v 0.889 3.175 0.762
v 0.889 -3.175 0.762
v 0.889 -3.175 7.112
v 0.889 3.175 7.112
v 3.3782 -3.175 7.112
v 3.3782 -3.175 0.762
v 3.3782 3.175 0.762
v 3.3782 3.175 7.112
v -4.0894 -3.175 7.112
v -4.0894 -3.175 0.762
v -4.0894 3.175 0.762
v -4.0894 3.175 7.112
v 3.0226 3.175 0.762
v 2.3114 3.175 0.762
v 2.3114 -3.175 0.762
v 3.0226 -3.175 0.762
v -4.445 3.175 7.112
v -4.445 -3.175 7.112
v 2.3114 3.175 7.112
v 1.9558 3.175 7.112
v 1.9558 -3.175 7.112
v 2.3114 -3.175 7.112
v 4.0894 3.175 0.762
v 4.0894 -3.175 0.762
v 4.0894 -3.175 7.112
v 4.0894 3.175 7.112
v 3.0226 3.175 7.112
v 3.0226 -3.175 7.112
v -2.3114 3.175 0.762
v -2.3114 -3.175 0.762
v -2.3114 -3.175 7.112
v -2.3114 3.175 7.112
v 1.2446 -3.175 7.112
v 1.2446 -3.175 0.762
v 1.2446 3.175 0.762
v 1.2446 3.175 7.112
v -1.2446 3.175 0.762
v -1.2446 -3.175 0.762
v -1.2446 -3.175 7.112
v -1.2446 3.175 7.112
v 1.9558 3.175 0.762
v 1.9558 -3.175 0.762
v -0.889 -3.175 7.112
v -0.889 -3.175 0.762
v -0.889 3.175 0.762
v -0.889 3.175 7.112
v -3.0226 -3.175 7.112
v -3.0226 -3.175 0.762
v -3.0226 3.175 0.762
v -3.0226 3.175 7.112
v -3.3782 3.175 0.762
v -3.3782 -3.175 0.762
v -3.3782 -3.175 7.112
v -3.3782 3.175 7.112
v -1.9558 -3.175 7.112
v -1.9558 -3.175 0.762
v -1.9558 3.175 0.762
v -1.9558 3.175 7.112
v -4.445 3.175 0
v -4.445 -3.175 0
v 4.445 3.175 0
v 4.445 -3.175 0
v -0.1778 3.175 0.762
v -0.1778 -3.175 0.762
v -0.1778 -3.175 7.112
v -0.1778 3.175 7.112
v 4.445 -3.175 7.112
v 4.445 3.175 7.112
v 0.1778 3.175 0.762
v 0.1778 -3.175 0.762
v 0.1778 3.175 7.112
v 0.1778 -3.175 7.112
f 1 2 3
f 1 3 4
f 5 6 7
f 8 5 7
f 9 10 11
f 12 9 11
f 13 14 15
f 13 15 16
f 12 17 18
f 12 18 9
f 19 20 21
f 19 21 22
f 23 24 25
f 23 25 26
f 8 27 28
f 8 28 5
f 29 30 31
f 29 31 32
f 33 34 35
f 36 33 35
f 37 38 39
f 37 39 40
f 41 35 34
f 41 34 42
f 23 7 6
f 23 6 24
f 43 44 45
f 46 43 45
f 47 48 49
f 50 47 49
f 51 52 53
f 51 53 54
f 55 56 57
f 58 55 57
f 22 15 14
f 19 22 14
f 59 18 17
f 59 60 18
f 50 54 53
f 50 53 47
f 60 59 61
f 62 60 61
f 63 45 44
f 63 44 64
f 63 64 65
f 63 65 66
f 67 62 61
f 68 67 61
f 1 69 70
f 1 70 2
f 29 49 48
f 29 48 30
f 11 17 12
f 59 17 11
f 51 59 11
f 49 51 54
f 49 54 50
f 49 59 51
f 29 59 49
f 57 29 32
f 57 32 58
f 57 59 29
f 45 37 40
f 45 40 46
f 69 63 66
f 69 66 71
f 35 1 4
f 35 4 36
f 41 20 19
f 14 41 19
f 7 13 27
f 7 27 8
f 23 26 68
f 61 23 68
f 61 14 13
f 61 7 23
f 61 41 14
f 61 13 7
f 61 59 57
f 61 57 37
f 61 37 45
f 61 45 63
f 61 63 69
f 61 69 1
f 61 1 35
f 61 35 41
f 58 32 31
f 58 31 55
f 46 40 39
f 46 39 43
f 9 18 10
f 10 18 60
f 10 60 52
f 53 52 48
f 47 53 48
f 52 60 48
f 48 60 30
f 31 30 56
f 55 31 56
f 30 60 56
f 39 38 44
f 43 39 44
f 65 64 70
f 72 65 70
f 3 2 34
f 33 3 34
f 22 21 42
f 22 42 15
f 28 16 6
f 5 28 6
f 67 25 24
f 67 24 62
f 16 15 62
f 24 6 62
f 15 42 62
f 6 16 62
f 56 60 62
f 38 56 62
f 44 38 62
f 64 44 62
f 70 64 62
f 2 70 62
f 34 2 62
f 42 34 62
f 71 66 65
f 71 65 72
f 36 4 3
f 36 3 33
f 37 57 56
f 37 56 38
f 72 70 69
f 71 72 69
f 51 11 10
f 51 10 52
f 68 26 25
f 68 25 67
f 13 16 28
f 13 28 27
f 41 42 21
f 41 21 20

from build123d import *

# Parameters (mm, degrees)
F0_W     = 8.89
F0_H     = 6.35
F1_DEPTH = 0.762
F2_W     = 0.3556
F2_H     = 6.35
F3_DEPTH = 6.35


with BuildPart() as f1:
    # F0 (on Top) → F1 (new body)
    with BuildSketch(Plane.XY):
        Rectangle(F0_W, F0_H)
    extrude(amount=F1_DEPTH)

    # F2 (on face) → F3 (join)
    with BuildSketch(Plane.XY.offset(0.762)):
        with Locations((-4.2672, 0)):
            Rectangle(F2_W, F2_H)
        with Locations((-3.2004, 0)):
            Rectangle(F2_W, F2_H)
        with Locations((-2.1336, 0)):
            Rectangle(F2_W, F2_H)
        with Locations((-1.0668, 0)):
            Rectangle(F2_W, F2_H)
        Rectangle(F2_W, F2_H)
        with Locations((1.0668, 0)):
            Rectangle(F2_W, F2_H)
        with Locations((2.1336, 0)):
            Rectangle(F2_W, F2_H)
        with Locations((3.2004, 0)):
            Rectangle(F2_W, F2_H)
        with Locations((4.2672, 0)):
            Rectangle(F2_W, F2_H)
    extrude(amount=F3_DEPTH)


solid = f1.part
